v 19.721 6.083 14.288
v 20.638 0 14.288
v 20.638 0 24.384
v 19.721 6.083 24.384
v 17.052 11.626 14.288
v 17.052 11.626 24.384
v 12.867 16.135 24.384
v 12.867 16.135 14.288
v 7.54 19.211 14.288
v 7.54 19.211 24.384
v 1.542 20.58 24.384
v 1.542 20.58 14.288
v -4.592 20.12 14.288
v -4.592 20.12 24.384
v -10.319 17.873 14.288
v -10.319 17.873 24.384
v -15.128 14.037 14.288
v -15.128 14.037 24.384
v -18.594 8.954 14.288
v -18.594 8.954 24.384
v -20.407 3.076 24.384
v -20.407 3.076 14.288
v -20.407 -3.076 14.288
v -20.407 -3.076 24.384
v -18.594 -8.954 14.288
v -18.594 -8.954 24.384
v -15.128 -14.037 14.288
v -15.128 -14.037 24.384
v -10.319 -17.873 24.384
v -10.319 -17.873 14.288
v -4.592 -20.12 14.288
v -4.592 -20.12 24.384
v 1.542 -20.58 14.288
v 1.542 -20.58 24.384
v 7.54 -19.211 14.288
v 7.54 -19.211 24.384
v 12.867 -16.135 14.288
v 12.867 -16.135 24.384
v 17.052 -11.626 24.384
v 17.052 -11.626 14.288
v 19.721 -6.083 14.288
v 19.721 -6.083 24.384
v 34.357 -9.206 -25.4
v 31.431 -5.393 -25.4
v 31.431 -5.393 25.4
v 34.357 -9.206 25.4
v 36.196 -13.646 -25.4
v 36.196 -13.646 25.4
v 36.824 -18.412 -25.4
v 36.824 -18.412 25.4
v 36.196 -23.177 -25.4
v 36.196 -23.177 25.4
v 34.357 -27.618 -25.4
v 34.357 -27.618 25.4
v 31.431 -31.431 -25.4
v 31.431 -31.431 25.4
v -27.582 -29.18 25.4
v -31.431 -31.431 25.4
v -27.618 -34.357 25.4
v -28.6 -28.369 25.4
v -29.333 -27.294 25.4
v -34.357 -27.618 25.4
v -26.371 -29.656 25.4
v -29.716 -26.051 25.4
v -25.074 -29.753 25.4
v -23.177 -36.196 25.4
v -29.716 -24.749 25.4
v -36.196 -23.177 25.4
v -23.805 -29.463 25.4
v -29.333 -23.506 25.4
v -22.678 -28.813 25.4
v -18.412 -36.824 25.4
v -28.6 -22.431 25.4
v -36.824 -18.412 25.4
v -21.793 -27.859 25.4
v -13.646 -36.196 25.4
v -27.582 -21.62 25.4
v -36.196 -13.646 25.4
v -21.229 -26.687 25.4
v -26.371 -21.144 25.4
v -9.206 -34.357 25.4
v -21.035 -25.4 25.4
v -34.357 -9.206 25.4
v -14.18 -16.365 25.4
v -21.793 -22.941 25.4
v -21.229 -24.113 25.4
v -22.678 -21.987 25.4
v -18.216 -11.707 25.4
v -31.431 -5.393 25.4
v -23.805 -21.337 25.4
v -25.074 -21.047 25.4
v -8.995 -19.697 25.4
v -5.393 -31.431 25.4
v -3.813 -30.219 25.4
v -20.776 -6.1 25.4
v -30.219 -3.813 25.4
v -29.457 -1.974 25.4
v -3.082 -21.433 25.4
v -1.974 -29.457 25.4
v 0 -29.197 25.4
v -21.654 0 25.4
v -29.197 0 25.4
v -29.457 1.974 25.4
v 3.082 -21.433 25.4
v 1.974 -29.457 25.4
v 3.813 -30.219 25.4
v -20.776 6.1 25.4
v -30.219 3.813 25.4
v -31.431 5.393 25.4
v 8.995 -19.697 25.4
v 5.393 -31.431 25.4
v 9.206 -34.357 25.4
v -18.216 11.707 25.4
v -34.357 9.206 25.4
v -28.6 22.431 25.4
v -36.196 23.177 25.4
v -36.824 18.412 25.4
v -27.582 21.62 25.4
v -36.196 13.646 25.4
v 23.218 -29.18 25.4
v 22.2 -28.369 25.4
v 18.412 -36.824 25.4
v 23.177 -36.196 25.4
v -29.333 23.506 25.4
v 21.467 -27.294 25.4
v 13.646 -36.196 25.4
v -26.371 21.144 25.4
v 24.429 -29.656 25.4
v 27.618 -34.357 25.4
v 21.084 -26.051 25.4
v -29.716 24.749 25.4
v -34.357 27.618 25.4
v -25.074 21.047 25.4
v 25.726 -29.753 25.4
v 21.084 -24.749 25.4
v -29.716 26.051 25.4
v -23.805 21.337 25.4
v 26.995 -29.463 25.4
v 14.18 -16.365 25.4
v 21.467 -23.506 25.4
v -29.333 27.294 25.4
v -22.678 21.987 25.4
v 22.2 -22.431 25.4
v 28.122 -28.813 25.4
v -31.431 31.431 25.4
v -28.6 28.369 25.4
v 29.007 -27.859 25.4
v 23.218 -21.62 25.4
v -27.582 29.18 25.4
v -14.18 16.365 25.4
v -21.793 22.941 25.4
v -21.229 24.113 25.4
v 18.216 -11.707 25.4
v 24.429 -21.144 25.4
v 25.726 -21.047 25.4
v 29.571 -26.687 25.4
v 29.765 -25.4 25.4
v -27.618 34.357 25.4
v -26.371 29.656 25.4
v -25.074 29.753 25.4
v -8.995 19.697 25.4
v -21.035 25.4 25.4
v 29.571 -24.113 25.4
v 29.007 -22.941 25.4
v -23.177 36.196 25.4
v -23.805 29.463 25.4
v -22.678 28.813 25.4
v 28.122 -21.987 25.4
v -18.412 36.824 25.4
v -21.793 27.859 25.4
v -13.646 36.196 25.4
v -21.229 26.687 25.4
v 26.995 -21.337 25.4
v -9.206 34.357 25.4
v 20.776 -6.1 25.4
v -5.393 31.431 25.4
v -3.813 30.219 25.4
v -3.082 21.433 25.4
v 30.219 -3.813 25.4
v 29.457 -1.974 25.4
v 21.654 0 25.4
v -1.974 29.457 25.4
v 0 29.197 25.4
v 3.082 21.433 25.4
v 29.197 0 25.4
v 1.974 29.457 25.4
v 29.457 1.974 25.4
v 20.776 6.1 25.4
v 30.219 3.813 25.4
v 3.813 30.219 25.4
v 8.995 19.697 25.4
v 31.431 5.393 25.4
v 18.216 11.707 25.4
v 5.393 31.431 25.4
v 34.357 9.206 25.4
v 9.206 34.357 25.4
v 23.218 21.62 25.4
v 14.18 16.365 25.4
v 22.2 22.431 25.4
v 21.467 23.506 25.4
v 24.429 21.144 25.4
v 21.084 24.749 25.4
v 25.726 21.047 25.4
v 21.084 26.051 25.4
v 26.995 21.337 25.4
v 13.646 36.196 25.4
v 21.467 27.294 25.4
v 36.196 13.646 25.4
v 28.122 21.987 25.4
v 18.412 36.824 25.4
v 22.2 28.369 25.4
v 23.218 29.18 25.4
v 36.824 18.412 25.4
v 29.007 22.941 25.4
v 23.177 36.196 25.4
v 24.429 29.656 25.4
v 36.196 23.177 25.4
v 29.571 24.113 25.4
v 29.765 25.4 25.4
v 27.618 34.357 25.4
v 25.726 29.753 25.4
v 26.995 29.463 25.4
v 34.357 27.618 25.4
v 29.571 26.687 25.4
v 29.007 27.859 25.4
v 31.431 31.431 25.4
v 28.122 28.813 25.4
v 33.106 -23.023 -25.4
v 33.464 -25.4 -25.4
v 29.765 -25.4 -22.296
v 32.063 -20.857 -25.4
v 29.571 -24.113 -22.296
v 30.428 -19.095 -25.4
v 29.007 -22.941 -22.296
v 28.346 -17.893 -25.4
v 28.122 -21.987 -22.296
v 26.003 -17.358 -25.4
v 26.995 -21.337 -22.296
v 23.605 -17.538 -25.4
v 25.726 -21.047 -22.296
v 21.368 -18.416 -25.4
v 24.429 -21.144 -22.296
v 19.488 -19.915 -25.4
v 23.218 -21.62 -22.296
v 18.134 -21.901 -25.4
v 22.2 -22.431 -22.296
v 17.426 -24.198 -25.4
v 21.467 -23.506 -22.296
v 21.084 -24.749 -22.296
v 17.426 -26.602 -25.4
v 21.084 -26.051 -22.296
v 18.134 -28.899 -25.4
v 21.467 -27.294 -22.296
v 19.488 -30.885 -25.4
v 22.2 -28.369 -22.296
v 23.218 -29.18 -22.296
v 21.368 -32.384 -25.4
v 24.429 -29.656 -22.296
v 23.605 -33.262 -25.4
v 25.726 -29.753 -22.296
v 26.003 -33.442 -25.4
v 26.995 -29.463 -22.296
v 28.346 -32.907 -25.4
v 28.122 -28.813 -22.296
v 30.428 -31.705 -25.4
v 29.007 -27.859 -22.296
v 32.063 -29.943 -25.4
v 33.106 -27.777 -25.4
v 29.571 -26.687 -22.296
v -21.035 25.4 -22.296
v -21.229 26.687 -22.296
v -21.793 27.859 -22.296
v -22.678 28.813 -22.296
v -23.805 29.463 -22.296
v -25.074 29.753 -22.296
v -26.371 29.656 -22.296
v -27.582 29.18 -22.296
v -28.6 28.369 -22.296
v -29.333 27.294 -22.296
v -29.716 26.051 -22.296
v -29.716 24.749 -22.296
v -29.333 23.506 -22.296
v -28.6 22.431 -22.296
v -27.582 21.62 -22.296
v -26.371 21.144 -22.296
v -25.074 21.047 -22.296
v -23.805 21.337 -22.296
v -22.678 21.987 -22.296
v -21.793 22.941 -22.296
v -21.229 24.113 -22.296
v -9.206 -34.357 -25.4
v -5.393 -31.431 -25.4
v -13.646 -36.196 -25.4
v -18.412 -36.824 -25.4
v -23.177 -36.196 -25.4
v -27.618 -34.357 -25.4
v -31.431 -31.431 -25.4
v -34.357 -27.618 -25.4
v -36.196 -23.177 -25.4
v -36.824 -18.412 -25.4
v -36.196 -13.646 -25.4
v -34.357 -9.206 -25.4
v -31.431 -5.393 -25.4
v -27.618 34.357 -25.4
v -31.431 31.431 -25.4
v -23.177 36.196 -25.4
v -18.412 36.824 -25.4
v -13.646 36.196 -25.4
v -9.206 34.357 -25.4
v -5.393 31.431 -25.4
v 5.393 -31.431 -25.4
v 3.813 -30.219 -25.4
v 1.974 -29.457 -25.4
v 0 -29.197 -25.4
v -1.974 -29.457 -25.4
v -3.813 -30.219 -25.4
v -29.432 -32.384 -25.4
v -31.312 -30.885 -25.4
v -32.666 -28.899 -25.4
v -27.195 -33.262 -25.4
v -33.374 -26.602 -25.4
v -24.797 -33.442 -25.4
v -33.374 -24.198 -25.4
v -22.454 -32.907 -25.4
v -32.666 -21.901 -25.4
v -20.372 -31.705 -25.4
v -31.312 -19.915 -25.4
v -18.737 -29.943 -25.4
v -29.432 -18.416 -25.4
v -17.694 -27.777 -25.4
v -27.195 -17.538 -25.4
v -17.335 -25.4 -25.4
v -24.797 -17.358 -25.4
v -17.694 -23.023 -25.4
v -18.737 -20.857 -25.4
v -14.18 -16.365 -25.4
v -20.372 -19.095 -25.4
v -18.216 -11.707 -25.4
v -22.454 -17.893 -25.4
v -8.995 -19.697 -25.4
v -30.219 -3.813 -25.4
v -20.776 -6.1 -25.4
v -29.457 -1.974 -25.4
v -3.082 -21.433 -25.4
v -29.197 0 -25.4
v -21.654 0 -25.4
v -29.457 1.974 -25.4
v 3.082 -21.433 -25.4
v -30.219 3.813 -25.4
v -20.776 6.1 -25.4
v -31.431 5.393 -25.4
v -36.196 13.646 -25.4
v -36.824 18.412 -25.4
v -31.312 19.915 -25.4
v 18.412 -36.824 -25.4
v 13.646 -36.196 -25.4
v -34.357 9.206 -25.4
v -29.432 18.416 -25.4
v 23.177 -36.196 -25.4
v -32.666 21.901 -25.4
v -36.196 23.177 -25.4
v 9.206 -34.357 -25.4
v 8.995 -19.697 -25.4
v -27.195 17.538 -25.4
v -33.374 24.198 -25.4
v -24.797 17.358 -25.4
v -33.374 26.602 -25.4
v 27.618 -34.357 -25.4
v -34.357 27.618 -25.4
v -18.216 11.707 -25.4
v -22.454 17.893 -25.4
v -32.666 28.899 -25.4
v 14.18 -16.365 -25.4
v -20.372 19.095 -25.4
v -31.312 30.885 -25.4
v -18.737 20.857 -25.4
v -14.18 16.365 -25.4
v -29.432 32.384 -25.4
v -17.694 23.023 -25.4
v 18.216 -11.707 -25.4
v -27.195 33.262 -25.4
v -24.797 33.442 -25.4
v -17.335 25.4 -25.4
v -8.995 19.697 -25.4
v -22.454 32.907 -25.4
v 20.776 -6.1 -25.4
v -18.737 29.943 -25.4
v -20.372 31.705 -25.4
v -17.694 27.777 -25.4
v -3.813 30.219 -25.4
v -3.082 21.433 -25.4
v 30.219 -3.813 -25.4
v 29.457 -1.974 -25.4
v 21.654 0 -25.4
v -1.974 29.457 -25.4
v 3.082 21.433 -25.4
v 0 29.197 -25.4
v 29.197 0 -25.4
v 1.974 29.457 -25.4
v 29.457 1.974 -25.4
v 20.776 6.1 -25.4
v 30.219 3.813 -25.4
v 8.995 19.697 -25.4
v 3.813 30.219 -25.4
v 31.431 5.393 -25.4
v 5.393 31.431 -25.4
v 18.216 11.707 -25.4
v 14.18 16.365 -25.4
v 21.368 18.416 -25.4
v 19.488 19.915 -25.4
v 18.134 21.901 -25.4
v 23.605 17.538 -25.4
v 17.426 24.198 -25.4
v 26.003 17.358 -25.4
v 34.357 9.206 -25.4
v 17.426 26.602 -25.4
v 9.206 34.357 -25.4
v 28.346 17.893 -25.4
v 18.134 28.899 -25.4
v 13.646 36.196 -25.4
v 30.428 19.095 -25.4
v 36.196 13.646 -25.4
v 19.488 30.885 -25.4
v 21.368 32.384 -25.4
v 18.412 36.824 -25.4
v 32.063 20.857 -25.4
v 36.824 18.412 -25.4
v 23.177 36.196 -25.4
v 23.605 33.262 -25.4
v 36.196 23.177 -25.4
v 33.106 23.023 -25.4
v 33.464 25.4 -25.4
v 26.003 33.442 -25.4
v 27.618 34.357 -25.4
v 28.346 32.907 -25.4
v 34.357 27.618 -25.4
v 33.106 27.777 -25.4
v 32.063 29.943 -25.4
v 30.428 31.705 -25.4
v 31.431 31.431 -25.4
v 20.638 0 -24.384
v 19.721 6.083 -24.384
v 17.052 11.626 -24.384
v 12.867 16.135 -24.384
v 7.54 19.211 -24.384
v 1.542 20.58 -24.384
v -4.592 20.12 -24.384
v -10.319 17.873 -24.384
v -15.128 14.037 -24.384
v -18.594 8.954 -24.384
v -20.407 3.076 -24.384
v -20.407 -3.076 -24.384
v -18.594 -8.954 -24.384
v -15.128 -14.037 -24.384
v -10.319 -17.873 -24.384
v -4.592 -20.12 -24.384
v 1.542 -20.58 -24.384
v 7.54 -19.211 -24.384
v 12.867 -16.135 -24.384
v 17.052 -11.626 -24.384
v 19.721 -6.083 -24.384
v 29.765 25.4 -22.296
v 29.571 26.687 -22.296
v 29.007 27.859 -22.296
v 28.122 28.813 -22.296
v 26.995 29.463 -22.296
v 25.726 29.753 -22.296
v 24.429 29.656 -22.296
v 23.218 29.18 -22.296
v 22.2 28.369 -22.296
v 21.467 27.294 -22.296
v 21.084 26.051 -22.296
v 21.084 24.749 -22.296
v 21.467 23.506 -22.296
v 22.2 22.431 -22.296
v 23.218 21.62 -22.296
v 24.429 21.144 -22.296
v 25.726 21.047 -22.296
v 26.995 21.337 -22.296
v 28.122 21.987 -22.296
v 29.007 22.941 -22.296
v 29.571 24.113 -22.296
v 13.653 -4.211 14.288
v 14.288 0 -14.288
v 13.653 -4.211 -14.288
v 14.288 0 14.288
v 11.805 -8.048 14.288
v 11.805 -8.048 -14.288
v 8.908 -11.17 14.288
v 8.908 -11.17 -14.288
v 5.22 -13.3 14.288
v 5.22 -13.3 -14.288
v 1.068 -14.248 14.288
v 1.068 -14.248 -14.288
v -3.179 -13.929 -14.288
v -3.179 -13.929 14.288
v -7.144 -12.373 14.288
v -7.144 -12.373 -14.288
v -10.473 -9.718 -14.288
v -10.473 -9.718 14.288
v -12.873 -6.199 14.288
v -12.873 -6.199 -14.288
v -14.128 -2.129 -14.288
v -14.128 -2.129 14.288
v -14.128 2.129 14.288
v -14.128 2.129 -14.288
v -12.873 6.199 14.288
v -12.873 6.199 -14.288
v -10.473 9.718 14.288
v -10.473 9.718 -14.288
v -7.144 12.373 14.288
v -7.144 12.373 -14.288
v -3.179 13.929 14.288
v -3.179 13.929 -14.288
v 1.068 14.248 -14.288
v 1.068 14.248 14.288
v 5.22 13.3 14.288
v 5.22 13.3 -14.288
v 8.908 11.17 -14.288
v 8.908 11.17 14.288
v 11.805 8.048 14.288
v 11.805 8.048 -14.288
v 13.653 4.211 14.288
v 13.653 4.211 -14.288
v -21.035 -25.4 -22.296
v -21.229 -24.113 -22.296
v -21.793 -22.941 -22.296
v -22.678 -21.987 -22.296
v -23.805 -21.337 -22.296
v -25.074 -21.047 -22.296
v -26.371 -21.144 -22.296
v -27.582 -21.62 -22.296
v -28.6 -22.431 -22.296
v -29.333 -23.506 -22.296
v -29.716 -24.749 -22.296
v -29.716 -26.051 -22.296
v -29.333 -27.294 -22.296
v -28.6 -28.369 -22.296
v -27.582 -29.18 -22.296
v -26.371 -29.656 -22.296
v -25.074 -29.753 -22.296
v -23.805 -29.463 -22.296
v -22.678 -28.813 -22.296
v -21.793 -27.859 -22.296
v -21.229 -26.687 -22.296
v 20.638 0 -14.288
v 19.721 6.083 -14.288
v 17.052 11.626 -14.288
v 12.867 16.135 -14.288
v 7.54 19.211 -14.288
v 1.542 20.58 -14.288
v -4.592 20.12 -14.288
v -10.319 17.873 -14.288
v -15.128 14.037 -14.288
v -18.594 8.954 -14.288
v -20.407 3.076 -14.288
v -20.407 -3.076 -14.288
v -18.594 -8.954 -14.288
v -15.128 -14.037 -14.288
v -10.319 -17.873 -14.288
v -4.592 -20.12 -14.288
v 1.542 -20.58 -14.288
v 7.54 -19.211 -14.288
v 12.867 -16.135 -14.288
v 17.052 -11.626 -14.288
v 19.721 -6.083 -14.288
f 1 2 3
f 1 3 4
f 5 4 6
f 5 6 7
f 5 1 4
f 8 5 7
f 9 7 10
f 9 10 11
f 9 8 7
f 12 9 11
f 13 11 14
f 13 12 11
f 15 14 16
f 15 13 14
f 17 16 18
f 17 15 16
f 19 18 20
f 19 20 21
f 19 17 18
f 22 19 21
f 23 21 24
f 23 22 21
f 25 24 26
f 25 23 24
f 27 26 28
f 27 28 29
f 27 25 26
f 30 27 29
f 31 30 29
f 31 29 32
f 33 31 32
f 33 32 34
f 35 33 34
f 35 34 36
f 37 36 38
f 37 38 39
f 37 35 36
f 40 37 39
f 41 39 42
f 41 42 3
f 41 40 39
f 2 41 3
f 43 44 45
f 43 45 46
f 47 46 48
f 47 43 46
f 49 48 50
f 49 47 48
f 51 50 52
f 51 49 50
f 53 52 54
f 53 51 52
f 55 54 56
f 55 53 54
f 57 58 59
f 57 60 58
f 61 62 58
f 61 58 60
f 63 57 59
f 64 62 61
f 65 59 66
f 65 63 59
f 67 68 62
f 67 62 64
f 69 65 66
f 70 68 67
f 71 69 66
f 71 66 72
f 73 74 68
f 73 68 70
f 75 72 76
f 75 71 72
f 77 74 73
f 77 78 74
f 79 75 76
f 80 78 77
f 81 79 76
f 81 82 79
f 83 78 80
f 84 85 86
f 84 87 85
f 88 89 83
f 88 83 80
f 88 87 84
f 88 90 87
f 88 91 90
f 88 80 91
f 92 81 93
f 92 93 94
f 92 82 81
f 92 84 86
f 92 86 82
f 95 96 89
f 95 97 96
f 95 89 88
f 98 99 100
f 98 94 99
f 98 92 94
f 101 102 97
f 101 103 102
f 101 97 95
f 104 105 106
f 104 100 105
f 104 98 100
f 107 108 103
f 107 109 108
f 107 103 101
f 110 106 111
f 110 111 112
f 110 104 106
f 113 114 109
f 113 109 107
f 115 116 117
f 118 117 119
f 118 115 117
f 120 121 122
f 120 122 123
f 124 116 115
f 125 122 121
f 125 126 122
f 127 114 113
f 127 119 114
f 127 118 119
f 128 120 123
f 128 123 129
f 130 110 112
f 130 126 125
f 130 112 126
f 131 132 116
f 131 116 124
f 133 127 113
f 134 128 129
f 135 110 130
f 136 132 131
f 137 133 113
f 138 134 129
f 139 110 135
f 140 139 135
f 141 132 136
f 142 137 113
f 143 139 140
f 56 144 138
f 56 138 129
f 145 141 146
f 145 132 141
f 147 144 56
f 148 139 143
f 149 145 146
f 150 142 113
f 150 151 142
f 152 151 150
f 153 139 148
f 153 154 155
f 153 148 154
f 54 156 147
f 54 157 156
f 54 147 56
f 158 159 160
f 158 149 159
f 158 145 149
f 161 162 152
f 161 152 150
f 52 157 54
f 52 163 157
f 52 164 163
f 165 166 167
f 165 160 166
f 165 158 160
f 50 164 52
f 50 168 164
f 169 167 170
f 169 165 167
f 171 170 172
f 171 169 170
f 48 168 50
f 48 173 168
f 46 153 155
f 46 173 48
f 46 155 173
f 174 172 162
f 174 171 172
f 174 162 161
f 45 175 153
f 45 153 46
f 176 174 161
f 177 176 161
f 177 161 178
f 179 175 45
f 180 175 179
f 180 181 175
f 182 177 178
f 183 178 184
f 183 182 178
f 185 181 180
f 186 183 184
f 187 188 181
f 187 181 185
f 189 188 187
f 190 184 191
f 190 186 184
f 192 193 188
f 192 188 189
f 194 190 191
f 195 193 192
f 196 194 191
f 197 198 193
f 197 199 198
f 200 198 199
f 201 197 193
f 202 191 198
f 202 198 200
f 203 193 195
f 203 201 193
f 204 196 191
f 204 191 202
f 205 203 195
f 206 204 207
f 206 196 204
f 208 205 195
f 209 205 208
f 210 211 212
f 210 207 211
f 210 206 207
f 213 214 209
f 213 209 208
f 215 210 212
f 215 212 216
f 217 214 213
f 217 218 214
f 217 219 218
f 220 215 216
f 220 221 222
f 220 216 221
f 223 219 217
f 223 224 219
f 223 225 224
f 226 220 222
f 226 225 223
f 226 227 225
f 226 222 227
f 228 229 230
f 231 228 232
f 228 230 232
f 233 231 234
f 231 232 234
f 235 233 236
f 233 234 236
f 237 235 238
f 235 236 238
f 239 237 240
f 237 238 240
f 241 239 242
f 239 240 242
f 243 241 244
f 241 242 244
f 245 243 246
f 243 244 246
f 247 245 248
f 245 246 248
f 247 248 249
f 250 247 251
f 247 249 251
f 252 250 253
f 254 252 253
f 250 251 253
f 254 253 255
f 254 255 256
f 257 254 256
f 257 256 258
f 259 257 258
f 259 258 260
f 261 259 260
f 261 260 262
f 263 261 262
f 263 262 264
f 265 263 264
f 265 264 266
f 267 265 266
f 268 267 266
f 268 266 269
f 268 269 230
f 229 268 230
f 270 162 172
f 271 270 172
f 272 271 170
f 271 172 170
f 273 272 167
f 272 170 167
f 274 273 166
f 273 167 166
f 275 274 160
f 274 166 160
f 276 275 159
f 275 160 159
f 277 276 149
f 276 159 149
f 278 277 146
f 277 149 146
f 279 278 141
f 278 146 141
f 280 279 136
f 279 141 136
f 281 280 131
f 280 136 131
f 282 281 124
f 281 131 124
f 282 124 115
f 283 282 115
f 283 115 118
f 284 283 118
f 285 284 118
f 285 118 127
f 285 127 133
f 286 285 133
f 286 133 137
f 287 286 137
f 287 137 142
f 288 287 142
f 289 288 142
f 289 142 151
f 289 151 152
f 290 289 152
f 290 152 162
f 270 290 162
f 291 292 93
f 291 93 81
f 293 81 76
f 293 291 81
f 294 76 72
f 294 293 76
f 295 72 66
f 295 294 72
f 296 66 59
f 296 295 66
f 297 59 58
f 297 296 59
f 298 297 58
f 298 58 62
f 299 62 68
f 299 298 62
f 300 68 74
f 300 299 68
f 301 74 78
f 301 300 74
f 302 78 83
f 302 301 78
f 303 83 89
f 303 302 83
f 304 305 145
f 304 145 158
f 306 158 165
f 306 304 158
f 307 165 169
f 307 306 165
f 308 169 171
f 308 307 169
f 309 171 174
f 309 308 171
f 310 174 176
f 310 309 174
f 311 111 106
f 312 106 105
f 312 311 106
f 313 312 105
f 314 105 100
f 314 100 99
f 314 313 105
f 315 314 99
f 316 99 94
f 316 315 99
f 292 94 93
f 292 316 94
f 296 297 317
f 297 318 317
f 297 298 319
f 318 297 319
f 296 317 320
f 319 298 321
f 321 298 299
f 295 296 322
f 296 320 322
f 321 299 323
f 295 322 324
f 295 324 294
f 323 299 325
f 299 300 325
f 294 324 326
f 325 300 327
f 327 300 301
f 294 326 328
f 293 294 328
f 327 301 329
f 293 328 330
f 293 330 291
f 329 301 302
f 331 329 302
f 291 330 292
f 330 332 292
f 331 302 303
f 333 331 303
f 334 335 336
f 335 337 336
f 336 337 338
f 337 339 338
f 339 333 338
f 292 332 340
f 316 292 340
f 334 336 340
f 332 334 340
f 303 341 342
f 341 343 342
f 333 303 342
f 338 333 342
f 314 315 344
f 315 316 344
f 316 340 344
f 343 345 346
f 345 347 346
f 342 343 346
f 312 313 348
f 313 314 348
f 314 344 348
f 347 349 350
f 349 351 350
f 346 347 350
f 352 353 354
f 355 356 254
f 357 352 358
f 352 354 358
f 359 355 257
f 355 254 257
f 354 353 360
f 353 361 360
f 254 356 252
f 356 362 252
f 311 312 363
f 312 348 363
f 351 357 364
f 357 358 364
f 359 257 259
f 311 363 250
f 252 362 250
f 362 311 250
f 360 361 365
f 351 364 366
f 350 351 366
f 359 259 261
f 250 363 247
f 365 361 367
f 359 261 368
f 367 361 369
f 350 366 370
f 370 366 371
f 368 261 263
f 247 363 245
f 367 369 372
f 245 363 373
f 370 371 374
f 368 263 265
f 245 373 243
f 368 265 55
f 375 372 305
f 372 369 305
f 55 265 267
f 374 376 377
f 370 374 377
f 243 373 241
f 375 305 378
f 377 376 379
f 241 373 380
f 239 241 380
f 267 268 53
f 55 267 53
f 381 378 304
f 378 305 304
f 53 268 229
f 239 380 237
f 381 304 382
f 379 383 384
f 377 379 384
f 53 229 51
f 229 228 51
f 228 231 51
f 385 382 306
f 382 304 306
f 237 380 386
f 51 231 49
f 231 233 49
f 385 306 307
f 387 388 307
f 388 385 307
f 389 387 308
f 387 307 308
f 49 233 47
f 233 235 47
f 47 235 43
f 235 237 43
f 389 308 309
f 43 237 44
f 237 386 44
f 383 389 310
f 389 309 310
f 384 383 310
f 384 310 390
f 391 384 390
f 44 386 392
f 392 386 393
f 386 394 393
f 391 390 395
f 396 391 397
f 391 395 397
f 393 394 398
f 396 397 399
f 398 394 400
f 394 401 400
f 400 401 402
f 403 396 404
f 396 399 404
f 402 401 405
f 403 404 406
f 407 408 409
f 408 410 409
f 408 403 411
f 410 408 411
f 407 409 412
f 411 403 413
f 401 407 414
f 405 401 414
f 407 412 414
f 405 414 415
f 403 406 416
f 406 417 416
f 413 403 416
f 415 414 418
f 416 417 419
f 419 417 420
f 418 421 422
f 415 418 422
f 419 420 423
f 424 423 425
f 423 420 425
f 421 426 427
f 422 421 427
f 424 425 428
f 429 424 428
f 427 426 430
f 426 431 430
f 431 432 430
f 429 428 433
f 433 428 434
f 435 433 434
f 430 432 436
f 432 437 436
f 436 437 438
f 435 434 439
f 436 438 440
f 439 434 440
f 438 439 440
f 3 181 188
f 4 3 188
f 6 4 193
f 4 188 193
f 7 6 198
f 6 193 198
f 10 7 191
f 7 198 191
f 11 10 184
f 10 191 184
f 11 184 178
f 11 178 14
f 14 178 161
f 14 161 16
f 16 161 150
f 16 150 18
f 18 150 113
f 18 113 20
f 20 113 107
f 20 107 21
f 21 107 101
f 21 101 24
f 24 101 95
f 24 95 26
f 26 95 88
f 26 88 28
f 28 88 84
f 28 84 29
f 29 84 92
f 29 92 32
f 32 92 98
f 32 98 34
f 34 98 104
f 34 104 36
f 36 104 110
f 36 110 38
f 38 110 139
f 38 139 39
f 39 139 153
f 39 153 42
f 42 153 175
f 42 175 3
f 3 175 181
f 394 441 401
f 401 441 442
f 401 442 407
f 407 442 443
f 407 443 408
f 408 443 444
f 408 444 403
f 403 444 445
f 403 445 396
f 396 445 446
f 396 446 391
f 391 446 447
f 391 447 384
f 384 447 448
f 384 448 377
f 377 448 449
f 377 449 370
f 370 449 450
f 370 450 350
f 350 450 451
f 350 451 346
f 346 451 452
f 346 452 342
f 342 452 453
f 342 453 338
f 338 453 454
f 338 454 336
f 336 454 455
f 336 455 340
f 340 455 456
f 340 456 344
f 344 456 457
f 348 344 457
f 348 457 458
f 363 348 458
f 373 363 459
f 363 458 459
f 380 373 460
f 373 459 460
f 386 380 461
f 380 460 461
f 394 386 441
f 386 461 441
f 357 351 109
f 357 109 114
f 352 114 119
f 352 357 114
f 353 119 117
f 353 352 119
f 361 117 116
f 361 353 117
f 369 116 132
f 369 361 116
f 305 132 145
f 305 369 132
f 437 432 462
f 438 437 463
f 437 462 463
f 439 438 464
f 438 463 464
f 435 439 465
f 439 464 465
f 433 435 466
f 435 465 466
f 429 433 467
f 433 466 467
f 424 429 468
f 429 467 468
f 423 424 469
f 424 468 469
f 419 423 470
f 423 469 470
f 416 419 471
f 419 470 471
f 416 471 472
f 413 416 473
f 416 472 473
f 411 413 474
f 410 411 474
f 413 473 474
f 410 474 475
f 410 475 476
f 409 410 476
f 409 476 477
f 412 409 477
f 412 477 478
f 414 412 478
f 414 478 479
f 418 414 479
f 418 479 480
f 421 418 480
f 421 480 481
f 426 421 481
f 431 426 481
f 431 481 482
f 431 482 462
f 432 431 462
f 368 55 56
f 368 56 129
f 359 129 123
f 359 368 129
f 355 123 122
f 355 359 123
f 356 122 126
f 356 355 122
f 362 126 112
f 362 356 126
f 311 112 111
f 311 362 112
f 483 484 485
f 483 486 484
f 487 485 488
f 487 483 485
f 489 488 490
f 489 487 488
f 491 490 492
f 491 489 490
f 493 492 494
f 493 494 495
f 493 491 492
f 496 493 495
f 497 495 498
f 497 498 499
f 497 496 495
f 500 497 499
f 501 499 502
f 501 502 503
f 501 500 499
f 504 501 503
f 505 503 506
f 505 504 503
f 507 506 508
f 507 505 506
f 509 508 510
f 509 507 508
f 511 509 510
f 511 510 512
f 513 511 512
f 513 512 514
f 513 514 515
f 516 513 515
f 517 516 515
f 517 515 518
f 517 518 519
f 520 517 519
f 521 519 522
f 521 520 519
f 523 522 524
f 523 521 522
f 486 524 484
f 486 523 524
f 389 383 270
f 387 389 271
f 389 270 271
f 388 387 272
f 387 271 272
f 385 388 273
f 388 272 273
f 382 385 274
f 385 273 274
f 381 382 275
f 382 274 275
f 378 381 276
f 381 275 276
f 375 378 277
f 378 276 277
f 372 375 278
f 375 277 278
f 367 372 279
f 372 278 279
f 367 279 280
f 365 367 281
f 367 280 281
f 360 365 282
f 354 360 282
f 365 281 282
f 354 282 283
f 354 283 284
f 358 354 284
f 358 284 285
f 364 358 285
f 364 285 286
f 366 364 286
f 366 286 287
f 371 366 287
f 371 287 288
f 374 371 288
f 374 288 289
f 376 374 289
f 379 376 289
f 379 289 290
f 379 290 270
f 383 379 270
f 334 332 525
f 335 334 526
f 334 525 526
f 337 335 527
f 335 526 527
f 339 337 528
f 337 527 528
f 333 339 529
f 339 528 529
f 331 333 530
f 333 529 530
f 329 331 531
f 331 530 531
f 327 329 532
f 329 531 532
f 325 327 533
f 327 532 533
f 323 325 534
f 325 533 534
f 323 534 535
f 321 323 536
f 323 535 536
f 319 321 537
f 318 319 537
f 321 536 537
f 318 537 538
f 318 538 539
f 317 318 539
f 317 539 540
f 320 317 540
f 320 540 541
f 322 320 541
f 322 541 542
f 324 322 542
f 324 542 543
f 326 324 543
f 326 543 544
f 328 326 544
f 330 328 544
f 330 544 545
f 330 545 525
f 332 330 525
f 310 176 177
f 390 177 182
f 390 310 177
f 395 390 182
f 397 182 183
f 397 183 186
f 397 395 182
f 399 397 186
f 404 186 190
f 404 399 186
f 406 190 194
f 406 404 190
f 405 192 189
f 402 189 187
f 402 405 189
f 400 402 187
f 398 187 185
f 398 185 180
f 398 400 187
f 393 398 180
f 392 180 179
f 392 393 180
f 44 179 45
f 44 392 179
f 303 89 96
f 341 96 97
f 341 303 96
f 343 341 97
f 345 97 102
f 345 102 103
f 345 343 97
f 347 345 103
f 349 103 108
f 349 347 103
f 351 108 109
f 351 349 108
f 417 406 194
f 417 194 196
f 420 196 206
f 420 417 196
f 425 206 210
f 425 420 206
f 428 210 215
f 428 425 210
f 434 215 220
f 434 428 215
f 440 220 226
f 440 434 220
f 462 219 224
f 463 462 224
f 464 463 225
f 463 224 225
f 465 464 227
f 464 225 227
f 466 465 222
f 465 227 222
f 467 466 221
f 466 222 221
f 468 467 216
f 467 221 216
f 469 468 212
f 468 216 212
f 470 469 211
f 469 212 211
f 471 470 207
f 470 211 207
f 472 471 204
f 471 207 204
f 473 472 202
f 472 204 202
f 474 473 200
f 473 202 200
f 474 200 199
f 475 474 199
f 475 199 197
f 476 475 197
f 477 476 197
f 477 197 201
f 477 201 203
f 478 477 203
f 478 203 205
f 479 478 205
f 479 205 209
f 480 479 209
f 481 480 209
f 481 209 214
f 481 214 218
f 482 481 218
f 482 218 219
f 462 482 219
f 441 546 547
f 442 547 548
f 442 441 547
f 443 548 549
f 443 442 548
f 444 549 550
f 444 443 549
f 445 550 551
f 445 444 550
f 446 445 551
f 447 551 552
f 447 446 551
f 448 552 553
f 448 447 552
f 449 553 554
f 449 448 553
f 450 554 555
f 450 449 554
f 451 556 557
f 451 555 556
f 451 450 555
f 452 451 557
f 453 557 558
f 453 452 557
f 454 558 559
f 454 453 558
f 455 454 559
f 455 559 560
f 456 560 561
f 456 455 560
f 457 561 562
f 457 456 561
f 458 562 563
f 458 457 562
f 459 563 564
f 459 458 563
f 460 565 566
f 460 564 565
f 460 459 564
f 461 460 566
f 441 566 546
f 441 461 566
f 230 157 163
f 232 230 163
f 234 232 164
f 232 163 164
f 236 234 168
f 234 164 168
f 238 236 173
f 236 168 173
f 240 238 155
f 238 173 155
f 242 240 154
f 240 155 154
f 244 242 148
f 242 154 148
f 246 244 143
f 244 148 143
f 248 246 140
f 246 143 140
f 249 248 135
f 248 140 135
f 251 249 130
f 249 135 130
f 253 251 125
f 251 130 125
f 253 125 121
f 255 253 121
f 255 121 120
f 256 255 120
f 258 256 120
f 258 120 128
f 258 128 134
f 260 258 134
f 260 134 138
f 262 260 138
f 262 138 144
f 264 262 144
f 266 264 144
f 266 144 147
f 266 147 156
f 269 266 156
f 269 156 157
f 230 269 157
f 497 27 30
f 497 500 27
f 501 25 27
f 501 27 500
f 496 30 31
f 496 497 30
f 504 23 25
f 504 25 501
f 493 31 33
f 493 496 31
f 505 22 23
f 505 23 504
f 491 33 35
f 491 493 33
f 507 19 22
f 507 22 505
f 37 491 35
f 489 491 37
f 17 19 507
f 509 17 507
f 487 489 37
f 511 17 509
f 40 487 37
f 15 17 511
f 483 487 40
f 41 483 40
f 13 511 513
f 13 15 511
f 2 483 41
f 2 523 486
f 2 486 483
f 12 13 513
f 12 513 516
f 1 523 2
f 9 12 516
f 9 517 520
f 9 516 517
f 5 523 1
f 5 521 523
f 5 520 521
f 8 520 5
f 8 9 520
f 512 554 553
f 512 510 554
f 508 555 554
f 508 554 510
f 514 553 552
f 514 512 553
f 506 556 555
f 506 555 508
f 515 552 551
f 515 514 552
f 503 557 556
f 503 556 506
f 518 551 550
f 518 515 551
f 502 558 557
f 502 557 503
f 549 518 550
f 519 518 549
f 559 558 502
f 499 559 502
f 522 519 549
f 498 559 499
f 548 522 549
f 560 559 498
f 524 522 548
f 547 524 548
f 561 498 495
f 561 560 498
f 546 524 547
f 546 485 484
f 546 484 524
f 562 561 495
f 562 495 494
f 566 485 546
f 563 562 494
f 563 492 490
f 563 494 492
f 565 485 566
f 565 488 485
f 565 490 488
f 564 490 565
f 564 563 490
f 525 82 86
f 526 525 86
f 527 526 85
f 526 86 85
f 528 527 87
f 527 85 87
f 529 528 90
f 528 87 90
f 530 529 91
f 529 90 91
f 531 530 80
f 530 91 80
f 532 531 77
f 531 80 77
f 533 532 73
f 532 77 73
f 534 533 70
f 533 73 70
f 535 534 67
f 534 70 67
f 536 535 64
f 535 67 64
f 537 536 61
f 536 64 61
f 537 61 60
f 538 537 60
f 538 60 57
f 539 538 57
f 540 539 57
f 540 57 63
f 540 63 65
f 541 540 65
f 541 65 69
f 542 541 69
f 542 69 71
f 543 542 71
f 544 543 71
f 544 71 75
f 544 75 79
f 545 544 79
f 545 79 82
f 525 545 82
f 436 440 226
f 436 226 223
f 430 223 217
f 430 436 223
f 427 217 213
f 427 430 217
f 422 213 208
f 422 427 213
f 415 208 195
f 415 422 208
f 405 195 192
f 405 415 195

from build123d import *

# Parameters (mm, degrees)
SKETCH1_R                                           = 44.45
SKETCH1_R_2                                         = 3.96875
SKETCH1_R_3                                         = 20.6375
BOSS_EXTRUDE1_DEPTH                                 = 25.4
SKETCH2_R                                           = 20.6375
SKETCH2_R_2                                         = 14.2875
BOSS_EXTRUDE2_DEPTH                                 = 14.2875
SKETCH3_R                                           = 20.6375
SKETCH3_R_2                                         = 14.2875
BOSS_EXTRUDE3_DEPTH                                 = 14.2875
CHAMFER1_SIZE                                       = 1.016
CUT_EXTRUDE1_DEPTH                                  = 50.8
CIRPATTERN1_COUNT                                   = 4
CSK_FOR_5_16_FLAT_HEAD_MACHINE_SCREW_10_D           = 8.72998
CSK_FOR_5_16_FLAT_HEAD_MACHINE_SCREW_10_DEPTH       = 50.8
CSK_FOR_5_16_FLAT_HEAD_MACHINE_SCREW_10_CSINK_D     = 16.129
CSK_FOR_5_16_FLAT_HEAD_MACHINE_SCREW_10_CSINK_ANGLE = 100


with BuildPart() as part:
    # Sketch1 → Boss-Extrude1 (new body, symmetric)
    with BuildSketch(Plane.XY):
        Circle(SKETCH1_R)
        with Locations((-25.4, 25.4)):
            Circle(SKETCH1_R_2, mode=Mode.SUBTRACT)
        with Locations((25.4, 25.4)):
            Circle(SKETCH1_R_2, mode=Mode.SUBTRACT)
        with Locations((25.4, -25.4)):
            Circle(SKETCH1_R_2, mode=Mode.SUBTRACT)
        with Locations((-25.4, -25.4)):
            Circle(SKETCH1_R_2, mode=Mode.SUBTRACT)
        Circle(SKETCH1_R_3, mode=Mode.SUBTRACT)
    extrude(amount=BOSS_EXTRUDE1_DEPTH, both=True)

    # Sketch2 → Boss-Extrude2 (add)
    with BuildSketch(Plane.XY):
        Circle(SKETCH2_R)
        Circle(SKETCH2_R_2, mode=Mode.SUBTRACT)
    extrude(amount=BOSS_EXTRUDE2_DEPTH)

    # Sketch3 → Boss-Extrude3 (add)
    with BuildSketch(Plane(origin=(0, 0, 0), x_dir=(-1, 0, 0), z_dir=(0, 0, -1))):
        with Locations(Location((0, 0, 0), (0, 0, 180))):  # turned: the seam where the file's is
            Circle(SKETCH3_R)
        with Locations(Location((0, 0, 0), (0, 0, 180))):  # turned: the seam where the file's is
            Circle(SKETCH3_R_2, mode=Mode.SUBTRACT)
    extrude(amount=BOSS_EXTRUDE3_DEPTH)

    # Chamfer1
    chamfer1_edges = [part.edges().sort_by_distance(p)[0] for p in [
        (-20.6375, 0, -25.4),
        (-20.6375, 0, 25.4),
    ]]
    chamfer(chamfer1_edges, length=CHAMFER1_SIZE)

    # Sketch4 → Cut-Extrude1 (cut)
    with BuildSketch(Plane(origin=(0, 0, -25.4), x_dir=(-1, 0, 0), z_dir=(0, 0, -1))):
        with BuildLine():
            ThreePointArc((-5.392689271, 31.430896424), (-18.411792847, 36.823585695), (-31.430896424, 31.430896424))
            ThreePointArc((-31.430896424, 31.430896424), (0, 44.45), (31.430896424, 31.430896424))
            ThreePointArc((31.430896424, 31.430896424), (18.411792847, 36.823585695), (5.392689271, 31.430896424))
            ThreePointArc((5.392689271, 31.430896424), (0, 29.19717139), (-5.392689271, 31.430896424))
        make_face()
    cut_extrude1 = extrude(amount=-CUT_EXTRUDE1_DEPTH, mode=Mode.SUBTRACT)

    # CirPattern1: Cut-Extrude1 ×4 about axis
    cirpattern1_axis = Axis((0, 0, 0), (0, 0, 1))
    for i in range(1, CIRPATTERN1_COUNT):
        add(cut_extrude1.rotate(cirpattern1_axis, i * 360 / CIRPATTERN1_COUNT), mode=Mode.SUBTRACT)

    # CSK for 5/16 Flat Head Machine Screw (100)1
    with Locations(Plane(origin=(0, 0, -25.4), x_dir=(-1, 0, 0), z_dir=(0, 0, -1))):
        with Locations((25.4, 25.4), (-25.4, 25.4), (-25.4, -25.4), (25.4, -25.4)):
            CounterSinkHole(CSK_FOR_5_16_FLAT_HEAD_MACHINE_SCREW_10_D / 2, CSK_FOR_5_16_FLAT_HEAD_MACHINE_SCREW_10_CSINK_D / 2, depth=CSK_FOR_5_16_FLAT_HEAD_MACHINE_SCREW_10_DEPTH, counter_sink_angle=CSK_FOR_5_16_FLAT_HEAD_MACHINE_SCREW_10_CSINK_ANGLE)


solid = part.part
